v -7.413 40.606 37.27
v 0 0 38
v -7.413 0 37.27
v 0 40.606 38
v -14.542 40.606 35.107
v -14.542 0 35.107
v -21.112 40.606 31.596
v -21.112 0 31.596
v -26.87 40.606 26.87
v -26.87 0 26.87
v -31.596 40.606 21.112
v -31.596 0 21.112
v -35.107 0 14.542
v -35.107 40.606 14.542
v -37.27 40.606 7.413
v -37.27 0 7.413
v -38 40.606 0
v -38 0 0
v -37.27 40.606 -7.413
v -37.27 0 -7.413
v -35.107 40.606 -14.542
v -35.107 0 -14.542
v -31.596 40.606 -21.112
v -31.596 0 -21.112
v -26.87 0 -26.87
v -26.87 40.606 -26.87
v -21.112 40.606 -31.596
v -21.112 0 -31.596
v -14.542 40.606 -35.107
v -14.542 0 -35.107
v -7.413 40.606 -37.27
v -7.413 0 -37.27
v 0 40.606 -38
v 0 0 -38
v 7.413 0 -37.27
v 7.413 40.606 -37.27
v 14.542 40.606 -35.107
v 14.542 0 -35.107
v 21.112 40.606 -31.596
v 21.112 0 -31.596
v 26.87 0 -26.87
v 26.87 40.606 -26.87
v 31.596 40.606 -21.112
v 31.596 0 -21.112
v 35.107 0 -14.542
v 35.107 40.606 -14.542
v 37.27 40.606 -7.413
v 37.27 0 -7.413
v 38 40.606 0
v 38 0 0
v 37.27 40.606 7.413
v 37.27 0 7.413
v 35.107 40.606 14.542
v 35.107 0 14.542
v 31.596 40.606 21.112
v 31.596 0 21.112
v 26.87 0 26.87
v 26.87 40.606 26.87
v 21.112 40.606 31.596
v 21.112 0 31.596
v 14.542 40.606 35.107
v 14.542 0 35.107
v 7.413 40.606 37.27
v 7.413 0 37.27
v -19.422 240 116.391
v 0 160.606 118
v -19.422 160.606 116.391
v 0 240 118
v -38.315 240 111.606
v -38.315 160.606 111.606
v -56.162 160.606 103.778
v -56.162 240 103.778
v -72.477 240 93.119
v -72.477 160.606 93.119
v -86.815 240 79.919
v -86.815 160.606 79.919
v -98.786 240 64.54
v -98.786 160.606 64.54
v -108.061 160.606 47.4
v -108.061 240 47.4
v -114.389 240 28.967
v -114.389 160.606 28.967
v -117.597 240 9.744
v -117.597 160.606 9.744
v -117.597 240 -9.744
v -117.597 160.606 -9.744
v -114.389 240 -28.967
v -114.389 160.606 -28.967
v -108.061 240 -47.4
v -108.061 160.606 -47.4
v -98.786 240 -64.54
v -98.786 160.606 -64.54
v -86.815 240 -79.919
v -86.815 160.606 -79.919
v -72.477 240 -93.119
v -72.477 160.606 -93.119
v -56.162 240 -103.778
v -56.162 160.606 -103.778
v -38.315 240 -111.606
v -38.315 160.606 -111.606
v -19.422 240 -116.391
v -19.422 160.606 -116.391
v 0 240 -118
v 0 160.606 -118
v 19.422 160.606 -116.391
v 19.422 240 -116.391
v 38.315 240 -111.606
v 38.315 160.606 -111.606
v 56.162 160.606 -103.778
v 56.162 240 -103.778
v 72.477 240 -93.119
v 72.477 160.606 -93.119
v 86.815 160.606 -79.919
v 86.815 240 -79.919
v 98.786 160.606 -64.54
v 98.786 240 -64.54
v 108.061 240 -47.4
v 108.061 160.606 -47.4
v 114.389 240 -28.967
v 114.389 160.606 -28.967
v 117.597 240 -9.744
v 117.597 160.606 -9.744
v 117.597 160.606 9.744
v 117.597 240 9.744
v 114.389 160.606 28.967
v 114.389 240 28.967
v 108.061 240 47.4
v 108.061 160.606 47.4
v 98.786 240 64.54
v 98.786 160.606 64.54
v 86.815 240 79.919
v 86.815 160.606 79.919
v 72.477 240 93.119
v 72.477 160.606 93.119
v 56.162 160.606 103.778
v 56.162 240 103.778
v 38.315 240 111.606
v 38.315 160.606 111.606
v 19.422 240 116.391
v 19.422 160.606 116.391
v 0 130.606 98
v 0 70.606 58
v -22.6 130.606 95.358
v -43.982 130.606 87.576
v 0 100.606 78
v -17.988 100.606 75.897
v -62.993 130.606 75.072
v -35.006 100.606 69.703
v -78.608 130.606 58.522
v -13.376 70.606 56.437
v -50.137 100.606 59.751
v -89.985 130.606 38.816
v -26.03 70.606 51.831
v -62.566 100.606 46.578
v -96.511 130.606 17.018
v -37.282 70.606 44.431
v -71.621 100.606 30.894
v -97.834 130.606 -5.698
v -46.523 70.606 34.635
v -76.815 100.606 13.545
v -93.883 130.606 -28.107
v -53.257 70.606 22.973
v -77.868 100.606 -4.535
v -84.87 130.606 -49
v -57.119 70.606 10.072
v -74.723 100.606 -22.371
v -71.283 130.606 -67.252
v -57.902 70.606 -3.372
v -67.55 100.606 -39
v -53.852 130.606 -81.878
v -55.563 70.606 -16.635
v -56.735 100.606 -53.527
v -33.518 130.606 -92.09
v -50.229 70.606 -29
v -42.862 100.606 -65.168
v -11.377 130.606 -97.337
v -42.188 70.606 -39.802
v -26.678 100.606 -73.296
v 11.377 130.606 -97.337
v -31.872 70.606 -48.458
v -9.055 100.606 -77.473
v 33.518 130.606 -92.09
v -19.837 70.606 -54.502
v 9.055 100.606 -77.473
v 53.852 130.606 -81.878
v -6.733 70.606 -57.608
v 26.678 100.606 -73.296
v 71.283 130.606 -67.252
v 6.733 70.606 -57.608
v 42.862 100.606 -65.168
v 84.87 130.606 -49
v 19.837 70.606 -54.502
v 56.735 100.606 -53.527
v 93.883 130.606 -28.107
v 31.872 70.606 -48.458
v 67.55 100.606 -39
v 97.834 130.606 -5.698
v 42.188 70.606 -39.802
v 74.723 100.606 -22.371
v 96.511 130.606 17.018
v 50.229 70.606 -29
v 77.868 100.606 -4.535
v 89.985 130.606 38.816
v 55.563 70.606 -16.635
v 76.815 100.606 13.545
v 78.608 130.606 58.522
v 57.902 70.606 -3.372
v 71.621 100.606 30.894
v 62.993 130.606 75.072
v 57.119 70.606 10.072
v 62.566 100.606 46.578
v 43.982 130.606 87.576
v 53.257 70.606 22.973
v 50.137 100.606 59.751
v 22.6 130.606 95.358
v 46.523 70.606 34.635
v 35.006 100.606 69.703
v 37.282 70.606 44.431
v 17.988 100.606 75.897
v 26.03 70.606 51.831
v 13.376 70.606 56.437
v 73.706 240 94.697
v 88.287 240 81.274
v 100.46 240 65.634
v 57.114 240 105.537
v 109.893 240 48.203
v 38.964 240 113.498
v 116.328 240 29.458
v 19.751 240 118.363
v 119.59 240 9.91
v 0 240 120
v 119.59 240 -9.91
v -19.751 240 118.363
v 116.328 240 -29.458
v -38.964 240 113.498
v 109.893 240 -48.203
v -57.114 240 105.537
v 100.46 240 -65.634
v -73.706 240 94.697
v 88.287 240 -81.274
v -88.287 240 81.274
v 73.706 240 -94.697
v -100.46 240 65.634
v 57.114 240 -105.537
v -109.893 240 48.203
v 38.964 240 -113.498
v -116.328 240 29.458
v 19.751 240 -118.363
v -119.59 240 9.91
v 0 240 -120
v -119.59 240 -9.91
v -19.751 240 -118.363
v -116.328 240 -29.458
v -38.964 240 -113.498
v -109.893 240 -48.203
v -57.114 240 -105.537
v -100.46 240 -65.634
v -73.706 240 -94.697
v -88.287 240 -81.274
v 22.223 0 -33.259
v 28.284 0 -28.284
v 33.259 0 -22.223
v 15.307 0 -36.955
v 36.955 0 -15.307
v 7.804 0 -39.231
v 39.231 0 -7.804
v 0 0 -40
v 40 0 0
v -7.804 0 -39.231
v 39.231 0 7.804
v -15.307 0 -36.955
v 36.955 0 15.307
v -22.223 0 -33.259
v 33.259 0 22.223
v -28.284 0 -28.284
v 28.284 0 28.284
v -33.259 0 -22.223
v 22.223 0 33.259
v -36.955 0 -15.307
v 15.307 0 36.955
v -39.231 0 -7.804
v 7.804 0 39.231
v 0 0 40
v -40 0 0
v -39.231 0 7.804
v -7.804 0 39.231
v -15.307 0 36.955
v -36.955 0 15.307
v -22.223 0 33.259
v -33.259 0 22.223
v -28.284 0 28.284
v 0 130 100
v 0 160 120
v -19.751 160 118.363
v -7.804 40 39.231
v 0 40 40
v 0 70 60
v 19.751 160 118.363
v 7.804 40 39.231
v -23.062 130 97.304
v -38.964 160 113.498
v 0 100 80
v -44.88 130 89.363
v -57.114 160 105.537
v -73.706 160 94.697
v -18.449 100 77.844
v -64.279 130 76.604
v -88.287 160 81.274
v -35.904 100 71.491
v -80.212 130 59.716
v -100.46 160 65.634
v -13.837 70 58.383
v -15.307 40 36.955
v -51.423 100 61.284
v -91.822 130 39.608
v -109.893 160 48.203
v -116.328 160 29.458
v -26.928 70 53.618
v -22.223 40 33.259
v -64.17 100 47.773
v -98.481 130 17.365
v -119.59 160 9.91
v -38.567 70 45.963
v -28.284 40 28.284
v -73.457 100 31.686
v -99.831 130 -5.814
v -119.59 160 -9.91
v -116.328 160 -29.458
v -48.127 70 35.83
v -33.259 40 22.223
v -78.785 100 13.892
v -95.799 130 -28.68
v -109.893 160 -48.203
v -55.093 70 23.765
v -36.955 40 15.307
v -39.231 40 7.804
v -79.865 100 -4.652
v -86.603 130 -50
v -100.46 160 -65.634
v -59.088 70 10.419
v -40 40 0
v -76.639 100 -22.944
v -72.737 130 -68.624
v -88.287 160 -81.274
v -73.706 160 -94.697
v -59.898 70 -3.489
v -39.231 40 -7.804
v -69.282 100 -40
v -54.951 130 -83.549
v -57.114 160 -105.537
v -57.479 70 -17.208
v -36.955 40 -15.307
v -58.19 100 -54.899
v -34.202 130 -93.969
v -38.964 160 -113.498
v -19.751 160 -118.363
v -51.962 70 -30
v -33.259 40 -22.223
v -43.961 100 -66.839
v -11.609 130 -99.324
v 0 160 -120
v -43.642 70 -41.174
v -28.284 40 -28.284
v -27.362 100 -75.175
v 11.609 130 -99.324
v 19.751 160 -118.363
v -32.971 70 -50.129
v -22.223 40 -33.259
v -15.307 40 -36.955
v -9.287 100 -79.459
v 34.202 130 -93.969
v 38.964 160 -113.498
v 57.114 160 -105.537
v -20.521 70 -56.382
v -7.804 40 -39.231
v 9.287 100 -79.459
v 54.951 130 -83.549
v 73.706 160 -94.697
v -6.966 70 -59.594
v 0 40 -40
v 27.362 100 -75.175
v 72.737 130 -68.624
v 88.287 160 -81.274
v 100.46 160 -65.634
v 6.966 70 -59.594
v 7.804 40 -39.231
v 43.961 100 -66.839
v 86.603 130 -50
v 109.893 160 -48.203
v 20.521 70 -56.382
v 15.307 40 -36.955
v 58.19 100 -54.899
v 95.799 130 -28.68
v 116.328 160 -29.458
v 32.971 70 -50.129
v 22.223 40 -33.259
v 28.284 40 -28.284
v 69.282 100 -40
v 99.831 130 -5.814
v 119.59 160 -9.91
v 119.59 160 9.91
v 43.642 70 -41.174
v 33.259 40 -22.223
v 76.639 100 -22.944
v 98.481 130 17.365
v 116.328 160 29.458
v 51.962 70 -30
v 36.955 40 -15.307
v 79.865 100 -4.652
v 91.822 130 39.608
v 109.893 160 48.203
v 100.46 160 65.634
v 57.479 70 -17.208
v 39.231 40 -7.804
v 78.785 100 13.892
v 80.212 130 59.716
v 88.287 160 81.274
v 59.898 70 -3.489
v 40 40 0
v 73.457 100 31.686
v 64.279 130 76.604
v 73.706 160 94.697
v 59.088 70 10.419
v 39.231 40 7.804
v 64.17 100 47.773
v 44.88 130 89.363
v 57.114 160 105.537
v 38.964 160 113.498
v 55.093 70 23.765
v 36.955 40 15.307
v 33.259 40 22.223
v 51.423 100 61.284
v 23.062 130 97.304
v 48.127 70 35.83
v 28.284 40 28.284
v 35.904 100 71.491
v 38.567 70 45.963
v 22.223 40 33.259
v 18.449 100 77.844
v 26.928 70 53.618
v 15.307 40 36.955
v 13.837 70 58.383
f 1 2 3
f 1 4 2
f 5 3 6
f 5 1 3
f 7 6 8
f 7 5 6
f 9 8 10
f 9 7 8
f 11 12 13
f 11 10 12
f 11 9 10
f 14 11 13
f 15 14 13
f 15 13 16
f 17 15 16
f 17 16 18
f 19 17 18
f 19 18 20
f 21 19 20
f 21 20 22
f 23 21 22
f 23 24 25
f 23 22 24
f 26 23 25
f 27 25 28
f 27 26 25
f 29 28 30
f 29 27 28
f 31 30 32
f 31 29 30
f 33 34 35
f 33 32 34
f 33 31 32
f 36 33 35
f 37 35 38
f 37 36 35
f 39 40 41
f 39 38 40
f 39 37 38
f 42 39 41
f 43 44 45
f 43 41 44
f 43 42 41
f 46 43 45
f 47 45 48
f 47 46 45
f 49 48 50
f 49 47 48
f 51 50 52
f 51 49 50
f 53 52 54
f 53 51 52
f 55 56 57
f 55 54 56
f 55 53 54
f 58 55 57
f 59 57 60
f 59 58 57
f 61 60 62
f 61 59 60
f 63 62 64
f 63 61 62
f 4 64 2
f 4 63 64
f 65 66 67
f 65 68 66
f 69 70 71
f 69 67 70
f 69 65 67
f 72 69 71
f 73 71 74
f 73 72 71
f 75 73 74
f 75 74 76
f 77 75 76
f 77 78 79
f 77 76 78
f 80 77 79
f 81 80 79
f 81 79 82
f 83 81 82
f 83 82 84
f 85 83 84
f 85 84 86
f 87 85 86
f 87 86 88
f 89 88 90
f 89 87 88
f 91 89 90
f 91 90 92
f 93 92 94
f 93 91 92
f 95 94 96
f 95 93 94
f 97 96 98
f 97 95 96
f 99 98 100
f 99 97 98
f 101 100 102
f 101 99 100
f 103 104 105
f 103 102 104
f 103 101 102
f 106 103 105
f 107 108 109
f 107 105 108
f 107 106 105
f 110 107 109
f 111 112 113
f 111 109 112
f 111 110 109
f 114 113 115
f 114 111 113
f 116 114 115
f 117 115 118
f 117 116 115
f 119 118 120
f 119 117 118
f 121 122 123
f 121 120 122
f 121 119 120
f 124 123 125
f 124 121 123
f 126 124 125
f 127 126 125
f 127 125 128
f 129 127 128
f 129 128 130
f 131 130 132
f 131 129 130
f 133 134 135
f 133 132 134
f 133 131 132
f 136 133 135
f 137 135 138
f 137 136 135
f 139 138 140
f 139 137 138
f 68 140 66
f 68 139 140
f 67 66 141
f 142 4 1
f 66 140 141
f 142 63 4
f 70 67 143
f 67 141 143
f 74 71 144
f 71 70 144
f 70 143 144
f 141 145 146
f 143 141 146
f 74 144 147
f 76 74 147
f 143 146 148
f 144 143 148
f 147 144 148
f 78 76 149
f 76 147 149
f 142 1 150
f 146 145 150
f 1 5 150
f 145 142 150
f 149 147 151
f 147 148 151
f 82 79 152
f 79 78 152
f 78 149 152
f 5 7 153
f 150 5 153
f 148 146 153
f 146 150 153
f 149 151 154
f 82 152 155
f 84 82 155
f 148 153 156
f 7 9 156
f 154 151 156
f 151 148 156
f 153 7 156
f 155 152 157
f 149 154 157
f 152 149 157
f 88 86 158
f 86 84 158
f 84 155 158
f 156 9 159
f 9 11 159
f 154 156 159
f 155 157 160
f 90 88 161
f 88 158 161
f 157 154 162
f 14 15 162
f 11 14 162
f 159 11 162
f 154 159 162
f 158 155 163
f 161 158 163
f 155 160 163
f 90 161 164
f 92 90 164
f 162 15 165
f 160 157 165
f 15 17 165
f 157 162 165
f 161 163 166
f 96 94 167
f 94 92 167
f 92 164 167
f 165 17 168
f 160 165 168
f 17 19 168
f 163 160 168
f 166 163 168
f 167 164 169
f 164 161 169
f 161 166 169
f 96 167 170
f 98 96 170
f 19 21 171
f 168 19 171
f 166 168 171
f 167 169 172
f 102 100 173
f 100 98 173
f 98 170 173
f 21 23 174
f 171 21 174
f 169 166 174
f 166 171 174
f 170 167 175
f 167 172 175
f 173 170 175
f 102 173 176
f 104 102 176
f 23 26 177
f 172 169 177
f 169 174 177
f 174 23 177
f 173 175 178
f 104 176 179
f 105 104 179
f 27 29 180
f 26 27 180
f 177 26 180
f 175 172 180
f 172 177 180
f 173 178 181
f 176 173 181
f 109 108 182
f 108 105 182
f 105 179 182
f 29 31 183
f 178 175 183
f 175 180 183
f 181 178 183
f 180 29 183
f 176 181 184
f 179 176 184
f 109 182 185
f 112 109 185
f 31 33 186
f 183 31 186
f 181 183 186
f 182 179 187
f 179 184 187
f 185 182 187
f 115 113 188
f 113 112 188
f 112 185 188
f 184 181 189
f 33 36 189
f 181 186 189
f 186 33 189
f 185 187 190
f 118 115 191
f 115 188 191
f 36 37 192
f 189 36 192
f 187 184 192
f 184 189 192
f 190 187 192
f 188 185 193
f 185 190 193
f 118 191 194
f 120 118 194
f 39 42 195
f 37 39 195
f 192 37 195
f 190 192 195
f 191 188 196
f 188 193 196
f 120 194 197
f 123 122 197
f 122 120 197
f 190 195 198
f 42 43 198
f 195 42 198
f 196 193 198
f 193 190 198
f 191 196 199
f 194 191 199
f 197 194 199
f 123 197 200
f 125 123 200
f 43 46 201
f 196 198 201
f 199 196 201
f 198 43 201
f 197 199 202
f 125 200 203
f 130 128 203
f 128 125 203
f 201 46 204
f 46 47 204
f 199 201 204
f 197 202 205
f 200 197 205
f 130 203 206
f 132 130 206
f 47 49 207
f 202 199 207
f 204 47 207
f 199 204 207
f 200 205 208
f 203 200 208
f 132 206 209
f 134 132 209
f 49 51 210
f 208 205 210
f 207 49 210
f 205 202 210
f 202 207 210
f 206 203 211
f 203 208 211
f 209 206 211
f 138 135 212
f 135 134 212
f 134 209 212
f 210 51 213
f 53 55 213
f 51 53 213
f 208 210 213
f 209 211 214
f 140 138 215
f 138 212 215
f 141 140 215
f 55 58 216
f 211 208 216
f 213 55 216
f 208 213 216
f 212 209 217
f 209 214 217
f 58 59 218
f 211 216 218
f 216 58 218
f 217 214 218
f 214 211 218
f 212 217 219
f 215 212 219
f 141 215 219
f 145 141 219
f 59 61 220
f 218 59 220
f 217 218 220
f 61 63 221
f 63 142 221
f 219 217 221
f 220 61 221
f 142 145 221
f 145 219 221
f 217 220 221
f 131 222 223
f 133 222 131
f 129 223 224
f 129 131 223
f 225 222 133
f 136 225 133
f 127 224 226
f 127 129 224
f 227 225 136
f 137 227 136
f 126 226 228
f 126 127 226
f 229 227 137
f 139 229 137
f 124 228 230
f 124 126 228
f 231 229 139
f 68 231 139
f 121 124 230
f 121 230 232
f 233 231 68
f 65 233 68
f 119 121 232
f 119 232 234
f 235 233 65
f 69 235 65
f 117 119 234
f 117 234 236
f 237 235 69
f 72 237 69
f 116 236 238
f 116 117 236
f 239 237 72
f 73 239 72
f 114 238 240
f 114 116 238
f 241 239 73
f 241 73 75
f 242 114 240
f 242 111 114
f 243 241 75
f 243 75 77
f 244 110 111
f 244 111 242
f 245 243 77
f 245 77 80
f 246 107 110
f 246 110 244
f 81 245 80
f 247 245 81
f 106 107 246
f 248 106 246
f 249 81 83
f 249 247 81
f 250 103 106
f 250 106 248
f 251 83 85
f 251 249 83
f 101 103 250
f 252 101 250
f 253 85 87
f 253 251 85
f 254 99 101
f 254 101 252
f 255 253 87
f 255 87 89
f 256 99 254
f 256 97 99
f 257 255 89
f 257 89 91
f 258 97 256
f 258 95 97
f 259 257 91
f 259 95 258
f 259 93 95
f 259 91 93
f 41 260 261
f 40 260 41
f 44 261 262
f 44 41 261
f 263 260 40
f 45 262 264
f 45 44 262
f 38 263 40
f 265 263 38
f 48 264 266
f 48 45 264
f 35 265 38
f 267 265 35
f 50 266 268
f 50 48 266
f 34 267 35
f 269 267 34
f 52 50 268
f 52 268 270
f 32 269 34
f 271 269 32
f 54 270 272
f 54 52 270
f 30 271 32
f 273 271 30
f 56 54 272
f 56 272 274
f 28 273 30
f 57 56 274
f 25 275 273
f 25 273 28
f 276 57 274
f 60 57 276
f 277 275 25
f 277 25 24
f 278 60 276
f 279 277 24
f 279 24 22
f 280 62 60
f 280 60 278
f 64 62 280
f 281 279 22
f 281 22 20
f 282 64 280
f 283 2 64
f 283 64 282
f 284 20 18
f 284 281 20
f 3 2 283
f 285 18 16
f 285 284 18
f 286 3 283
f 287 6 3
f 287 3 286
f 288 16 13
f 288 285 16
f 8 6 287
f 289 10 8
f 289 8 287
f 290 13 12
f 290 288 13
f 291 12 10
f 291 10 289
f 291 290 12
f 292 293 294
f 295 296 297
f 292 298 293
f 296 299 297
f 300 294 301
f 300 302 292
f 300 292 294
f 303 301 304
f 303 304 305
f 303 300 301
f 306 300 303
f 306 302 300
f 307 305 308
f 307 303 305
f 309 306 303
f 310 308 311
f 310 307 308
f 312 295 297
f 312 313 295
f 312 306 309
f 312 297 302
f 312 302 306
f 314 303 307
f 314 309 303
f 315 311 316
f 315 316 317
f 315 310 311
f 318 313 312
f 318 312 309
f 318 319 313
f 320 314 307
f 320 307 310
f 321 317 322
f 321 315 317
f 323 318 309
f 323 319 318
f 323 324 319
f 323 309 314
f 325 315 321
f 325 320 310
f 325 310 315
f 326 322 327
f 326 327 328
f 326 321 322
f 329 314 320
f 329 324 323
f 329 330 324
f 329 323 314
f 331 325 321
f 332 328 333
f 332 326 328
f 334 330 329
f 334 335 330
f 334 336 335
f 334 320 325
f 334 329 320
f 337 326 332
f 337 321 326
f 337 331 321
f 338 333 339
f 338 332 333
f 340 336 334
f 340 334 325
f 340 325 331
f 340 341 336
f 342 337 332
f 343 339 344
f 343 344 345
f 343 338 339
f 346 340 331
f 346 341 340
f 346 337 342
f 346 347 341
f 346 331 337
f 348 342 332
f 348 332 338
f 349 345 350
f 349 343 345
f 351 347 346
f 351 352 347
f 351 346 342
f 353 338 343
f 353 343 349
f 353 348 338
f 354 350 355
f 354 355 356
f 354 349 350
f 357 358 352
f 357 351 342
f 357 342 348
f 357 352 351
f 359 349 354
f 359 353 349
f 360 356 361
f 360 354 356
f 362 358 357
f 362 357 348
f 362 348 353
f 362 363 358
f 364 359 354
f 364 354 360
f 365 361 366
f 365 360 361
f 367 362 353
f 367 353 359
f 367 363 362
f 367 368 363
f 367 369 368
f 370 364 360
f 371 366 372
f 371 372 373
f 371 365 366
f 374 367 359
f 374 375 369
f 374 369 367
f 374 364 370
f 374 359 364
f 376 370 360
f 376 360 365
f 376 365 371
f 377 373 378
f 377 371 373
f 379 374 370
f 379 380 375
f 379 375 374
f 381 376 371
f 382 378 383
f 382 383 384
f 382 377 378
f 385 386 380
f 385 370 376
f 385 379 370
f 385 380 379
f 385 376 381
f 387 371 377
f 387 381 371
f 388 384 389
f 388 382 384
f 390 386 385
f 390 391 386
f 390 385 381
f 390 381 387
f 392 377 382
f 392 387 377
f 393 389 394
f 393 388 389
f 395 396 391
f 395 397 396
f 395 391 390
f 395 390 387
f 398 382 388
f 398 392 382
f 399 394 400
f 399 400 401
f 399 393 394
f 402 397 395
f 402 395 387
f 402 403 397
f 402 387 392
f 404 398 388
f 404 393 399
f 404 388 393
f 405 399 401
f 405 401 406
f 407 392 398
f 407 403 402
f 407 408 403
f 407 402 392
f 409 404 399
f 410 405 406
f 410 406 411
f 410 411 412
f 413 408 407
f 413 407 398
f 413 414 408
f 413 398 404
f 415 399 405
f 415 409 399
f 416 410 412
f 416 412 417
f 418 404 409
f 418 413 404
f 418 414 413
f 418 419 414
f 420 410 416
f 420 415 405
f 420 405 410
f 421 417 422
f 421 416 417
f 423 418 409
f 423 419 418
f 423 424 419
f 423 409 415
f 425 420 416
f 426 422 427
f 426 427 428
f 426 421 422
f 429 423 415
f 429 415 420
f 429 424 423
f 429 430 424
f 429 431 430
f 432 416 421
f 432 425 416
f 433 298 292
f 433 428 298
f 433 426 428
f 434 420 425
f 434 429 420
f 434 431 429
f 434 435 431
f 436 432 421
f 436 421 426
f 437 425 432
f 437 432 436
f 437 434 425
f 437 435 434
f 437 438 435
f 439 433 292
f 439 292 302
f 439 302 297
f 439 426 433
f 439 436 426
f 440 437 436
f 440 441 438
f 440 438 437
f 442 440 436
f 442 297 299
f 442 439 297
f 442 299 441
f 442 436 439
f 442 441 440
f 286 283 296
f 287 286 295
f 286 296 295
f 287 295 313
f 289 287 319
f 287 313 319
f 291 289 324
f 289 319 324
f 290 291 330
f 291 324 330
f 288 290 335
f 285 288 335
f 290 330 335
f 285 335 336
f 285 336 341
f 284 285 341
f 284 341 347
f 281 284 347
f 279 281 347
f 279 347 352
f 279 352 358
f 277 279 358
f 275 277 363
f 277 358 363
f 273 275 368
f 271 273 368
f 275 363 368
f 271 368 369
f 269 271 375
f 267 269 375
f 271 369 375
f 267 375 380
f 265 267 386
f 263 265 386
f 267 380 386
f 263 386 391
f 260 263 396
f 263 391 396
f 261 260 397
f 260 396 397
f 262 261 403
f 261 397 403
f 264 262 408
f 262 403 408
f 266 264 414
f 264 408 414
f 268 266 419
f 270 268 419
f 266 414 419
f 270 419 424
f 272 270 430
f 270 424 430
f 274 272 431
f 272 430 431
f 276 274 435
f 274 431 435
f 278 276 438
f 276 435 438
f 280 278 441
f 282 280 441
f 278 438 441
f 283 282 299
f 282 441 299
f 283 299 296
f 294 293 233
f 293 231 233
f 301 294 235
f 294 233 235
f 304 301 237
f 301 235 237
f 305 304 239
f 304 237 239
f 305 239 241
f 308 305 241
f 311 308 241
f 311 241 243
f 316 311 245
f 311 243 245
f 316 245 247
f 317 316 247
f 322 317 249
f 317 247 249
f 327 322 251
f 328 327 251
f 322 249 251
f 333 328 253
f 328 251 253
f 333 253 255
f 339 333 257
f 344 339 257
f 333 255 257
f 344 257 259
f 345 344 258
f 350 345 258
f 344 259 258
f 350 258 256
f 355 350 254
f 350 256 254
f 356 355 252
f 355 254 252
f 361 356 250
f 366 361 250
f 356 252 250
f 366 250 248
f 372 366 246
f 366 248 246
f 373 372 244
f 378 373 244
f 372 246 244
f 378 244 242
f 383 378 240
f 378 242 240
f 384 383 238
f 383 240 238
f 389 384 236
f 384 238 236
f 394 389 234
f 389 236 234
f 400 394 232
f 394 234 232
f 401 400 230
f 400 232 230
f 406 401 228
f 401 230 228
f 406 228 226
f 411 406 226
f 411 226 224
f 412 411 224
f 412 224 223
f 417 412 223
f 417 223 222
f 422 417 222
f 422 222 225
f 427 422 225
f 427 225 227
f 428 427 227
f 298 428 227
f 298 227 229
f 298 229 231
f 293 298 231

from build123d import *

# Parameters (mm, degrees)
SKETCH1_W   = 40
SKETCH1_H   = 120
SKETCH1_H_2 = 80
SKETCH1_W_2 = 80
SKETCH1_H_3 = 40
SHELL2_T    = -2


with BuildPart() as part:
    # Sketch1 → Revolve3 (revolve)
    with BuildSketch(Plane.XY, mode=Mode.PRIVATE) as revolve3_sk:
        with Locations((-20, 100)):
            Rectangle(SKETCH1_W, SKETCH1_H)
        with Locations((-20, 200)):
            Rectangle(SKETCH1_W, SKETCH1_H_2)
        with Locations((-80, 200)):
            Rectangle(SKETCH1_W_2, SKETCH1_H_2)
        Polygon((-40, 160), (-120, 160), (-40, 40), align=None)
        with Locations((-20, 20)):
            Rectangle(SKETCH1_W, SKETCH1_H_3)
    revolve(revolve3_sk.sketch.rotate(Axis((0, 249.803796798, 0), (0, -1, 0)), 270), axis=Axis((0, 249.803796798, 0), (0, -1, 0)))

    # Shell2
    shell2_openings = [part.faces().sort_by_distance(p)[0] for p in [
        (0, 240, 0),
        (0, 0, 0),
    ]]
    offset(amount=SHELL2_T, openings=shell2_openings, kind=Kind.INTERSECTION)


solid = part.part
